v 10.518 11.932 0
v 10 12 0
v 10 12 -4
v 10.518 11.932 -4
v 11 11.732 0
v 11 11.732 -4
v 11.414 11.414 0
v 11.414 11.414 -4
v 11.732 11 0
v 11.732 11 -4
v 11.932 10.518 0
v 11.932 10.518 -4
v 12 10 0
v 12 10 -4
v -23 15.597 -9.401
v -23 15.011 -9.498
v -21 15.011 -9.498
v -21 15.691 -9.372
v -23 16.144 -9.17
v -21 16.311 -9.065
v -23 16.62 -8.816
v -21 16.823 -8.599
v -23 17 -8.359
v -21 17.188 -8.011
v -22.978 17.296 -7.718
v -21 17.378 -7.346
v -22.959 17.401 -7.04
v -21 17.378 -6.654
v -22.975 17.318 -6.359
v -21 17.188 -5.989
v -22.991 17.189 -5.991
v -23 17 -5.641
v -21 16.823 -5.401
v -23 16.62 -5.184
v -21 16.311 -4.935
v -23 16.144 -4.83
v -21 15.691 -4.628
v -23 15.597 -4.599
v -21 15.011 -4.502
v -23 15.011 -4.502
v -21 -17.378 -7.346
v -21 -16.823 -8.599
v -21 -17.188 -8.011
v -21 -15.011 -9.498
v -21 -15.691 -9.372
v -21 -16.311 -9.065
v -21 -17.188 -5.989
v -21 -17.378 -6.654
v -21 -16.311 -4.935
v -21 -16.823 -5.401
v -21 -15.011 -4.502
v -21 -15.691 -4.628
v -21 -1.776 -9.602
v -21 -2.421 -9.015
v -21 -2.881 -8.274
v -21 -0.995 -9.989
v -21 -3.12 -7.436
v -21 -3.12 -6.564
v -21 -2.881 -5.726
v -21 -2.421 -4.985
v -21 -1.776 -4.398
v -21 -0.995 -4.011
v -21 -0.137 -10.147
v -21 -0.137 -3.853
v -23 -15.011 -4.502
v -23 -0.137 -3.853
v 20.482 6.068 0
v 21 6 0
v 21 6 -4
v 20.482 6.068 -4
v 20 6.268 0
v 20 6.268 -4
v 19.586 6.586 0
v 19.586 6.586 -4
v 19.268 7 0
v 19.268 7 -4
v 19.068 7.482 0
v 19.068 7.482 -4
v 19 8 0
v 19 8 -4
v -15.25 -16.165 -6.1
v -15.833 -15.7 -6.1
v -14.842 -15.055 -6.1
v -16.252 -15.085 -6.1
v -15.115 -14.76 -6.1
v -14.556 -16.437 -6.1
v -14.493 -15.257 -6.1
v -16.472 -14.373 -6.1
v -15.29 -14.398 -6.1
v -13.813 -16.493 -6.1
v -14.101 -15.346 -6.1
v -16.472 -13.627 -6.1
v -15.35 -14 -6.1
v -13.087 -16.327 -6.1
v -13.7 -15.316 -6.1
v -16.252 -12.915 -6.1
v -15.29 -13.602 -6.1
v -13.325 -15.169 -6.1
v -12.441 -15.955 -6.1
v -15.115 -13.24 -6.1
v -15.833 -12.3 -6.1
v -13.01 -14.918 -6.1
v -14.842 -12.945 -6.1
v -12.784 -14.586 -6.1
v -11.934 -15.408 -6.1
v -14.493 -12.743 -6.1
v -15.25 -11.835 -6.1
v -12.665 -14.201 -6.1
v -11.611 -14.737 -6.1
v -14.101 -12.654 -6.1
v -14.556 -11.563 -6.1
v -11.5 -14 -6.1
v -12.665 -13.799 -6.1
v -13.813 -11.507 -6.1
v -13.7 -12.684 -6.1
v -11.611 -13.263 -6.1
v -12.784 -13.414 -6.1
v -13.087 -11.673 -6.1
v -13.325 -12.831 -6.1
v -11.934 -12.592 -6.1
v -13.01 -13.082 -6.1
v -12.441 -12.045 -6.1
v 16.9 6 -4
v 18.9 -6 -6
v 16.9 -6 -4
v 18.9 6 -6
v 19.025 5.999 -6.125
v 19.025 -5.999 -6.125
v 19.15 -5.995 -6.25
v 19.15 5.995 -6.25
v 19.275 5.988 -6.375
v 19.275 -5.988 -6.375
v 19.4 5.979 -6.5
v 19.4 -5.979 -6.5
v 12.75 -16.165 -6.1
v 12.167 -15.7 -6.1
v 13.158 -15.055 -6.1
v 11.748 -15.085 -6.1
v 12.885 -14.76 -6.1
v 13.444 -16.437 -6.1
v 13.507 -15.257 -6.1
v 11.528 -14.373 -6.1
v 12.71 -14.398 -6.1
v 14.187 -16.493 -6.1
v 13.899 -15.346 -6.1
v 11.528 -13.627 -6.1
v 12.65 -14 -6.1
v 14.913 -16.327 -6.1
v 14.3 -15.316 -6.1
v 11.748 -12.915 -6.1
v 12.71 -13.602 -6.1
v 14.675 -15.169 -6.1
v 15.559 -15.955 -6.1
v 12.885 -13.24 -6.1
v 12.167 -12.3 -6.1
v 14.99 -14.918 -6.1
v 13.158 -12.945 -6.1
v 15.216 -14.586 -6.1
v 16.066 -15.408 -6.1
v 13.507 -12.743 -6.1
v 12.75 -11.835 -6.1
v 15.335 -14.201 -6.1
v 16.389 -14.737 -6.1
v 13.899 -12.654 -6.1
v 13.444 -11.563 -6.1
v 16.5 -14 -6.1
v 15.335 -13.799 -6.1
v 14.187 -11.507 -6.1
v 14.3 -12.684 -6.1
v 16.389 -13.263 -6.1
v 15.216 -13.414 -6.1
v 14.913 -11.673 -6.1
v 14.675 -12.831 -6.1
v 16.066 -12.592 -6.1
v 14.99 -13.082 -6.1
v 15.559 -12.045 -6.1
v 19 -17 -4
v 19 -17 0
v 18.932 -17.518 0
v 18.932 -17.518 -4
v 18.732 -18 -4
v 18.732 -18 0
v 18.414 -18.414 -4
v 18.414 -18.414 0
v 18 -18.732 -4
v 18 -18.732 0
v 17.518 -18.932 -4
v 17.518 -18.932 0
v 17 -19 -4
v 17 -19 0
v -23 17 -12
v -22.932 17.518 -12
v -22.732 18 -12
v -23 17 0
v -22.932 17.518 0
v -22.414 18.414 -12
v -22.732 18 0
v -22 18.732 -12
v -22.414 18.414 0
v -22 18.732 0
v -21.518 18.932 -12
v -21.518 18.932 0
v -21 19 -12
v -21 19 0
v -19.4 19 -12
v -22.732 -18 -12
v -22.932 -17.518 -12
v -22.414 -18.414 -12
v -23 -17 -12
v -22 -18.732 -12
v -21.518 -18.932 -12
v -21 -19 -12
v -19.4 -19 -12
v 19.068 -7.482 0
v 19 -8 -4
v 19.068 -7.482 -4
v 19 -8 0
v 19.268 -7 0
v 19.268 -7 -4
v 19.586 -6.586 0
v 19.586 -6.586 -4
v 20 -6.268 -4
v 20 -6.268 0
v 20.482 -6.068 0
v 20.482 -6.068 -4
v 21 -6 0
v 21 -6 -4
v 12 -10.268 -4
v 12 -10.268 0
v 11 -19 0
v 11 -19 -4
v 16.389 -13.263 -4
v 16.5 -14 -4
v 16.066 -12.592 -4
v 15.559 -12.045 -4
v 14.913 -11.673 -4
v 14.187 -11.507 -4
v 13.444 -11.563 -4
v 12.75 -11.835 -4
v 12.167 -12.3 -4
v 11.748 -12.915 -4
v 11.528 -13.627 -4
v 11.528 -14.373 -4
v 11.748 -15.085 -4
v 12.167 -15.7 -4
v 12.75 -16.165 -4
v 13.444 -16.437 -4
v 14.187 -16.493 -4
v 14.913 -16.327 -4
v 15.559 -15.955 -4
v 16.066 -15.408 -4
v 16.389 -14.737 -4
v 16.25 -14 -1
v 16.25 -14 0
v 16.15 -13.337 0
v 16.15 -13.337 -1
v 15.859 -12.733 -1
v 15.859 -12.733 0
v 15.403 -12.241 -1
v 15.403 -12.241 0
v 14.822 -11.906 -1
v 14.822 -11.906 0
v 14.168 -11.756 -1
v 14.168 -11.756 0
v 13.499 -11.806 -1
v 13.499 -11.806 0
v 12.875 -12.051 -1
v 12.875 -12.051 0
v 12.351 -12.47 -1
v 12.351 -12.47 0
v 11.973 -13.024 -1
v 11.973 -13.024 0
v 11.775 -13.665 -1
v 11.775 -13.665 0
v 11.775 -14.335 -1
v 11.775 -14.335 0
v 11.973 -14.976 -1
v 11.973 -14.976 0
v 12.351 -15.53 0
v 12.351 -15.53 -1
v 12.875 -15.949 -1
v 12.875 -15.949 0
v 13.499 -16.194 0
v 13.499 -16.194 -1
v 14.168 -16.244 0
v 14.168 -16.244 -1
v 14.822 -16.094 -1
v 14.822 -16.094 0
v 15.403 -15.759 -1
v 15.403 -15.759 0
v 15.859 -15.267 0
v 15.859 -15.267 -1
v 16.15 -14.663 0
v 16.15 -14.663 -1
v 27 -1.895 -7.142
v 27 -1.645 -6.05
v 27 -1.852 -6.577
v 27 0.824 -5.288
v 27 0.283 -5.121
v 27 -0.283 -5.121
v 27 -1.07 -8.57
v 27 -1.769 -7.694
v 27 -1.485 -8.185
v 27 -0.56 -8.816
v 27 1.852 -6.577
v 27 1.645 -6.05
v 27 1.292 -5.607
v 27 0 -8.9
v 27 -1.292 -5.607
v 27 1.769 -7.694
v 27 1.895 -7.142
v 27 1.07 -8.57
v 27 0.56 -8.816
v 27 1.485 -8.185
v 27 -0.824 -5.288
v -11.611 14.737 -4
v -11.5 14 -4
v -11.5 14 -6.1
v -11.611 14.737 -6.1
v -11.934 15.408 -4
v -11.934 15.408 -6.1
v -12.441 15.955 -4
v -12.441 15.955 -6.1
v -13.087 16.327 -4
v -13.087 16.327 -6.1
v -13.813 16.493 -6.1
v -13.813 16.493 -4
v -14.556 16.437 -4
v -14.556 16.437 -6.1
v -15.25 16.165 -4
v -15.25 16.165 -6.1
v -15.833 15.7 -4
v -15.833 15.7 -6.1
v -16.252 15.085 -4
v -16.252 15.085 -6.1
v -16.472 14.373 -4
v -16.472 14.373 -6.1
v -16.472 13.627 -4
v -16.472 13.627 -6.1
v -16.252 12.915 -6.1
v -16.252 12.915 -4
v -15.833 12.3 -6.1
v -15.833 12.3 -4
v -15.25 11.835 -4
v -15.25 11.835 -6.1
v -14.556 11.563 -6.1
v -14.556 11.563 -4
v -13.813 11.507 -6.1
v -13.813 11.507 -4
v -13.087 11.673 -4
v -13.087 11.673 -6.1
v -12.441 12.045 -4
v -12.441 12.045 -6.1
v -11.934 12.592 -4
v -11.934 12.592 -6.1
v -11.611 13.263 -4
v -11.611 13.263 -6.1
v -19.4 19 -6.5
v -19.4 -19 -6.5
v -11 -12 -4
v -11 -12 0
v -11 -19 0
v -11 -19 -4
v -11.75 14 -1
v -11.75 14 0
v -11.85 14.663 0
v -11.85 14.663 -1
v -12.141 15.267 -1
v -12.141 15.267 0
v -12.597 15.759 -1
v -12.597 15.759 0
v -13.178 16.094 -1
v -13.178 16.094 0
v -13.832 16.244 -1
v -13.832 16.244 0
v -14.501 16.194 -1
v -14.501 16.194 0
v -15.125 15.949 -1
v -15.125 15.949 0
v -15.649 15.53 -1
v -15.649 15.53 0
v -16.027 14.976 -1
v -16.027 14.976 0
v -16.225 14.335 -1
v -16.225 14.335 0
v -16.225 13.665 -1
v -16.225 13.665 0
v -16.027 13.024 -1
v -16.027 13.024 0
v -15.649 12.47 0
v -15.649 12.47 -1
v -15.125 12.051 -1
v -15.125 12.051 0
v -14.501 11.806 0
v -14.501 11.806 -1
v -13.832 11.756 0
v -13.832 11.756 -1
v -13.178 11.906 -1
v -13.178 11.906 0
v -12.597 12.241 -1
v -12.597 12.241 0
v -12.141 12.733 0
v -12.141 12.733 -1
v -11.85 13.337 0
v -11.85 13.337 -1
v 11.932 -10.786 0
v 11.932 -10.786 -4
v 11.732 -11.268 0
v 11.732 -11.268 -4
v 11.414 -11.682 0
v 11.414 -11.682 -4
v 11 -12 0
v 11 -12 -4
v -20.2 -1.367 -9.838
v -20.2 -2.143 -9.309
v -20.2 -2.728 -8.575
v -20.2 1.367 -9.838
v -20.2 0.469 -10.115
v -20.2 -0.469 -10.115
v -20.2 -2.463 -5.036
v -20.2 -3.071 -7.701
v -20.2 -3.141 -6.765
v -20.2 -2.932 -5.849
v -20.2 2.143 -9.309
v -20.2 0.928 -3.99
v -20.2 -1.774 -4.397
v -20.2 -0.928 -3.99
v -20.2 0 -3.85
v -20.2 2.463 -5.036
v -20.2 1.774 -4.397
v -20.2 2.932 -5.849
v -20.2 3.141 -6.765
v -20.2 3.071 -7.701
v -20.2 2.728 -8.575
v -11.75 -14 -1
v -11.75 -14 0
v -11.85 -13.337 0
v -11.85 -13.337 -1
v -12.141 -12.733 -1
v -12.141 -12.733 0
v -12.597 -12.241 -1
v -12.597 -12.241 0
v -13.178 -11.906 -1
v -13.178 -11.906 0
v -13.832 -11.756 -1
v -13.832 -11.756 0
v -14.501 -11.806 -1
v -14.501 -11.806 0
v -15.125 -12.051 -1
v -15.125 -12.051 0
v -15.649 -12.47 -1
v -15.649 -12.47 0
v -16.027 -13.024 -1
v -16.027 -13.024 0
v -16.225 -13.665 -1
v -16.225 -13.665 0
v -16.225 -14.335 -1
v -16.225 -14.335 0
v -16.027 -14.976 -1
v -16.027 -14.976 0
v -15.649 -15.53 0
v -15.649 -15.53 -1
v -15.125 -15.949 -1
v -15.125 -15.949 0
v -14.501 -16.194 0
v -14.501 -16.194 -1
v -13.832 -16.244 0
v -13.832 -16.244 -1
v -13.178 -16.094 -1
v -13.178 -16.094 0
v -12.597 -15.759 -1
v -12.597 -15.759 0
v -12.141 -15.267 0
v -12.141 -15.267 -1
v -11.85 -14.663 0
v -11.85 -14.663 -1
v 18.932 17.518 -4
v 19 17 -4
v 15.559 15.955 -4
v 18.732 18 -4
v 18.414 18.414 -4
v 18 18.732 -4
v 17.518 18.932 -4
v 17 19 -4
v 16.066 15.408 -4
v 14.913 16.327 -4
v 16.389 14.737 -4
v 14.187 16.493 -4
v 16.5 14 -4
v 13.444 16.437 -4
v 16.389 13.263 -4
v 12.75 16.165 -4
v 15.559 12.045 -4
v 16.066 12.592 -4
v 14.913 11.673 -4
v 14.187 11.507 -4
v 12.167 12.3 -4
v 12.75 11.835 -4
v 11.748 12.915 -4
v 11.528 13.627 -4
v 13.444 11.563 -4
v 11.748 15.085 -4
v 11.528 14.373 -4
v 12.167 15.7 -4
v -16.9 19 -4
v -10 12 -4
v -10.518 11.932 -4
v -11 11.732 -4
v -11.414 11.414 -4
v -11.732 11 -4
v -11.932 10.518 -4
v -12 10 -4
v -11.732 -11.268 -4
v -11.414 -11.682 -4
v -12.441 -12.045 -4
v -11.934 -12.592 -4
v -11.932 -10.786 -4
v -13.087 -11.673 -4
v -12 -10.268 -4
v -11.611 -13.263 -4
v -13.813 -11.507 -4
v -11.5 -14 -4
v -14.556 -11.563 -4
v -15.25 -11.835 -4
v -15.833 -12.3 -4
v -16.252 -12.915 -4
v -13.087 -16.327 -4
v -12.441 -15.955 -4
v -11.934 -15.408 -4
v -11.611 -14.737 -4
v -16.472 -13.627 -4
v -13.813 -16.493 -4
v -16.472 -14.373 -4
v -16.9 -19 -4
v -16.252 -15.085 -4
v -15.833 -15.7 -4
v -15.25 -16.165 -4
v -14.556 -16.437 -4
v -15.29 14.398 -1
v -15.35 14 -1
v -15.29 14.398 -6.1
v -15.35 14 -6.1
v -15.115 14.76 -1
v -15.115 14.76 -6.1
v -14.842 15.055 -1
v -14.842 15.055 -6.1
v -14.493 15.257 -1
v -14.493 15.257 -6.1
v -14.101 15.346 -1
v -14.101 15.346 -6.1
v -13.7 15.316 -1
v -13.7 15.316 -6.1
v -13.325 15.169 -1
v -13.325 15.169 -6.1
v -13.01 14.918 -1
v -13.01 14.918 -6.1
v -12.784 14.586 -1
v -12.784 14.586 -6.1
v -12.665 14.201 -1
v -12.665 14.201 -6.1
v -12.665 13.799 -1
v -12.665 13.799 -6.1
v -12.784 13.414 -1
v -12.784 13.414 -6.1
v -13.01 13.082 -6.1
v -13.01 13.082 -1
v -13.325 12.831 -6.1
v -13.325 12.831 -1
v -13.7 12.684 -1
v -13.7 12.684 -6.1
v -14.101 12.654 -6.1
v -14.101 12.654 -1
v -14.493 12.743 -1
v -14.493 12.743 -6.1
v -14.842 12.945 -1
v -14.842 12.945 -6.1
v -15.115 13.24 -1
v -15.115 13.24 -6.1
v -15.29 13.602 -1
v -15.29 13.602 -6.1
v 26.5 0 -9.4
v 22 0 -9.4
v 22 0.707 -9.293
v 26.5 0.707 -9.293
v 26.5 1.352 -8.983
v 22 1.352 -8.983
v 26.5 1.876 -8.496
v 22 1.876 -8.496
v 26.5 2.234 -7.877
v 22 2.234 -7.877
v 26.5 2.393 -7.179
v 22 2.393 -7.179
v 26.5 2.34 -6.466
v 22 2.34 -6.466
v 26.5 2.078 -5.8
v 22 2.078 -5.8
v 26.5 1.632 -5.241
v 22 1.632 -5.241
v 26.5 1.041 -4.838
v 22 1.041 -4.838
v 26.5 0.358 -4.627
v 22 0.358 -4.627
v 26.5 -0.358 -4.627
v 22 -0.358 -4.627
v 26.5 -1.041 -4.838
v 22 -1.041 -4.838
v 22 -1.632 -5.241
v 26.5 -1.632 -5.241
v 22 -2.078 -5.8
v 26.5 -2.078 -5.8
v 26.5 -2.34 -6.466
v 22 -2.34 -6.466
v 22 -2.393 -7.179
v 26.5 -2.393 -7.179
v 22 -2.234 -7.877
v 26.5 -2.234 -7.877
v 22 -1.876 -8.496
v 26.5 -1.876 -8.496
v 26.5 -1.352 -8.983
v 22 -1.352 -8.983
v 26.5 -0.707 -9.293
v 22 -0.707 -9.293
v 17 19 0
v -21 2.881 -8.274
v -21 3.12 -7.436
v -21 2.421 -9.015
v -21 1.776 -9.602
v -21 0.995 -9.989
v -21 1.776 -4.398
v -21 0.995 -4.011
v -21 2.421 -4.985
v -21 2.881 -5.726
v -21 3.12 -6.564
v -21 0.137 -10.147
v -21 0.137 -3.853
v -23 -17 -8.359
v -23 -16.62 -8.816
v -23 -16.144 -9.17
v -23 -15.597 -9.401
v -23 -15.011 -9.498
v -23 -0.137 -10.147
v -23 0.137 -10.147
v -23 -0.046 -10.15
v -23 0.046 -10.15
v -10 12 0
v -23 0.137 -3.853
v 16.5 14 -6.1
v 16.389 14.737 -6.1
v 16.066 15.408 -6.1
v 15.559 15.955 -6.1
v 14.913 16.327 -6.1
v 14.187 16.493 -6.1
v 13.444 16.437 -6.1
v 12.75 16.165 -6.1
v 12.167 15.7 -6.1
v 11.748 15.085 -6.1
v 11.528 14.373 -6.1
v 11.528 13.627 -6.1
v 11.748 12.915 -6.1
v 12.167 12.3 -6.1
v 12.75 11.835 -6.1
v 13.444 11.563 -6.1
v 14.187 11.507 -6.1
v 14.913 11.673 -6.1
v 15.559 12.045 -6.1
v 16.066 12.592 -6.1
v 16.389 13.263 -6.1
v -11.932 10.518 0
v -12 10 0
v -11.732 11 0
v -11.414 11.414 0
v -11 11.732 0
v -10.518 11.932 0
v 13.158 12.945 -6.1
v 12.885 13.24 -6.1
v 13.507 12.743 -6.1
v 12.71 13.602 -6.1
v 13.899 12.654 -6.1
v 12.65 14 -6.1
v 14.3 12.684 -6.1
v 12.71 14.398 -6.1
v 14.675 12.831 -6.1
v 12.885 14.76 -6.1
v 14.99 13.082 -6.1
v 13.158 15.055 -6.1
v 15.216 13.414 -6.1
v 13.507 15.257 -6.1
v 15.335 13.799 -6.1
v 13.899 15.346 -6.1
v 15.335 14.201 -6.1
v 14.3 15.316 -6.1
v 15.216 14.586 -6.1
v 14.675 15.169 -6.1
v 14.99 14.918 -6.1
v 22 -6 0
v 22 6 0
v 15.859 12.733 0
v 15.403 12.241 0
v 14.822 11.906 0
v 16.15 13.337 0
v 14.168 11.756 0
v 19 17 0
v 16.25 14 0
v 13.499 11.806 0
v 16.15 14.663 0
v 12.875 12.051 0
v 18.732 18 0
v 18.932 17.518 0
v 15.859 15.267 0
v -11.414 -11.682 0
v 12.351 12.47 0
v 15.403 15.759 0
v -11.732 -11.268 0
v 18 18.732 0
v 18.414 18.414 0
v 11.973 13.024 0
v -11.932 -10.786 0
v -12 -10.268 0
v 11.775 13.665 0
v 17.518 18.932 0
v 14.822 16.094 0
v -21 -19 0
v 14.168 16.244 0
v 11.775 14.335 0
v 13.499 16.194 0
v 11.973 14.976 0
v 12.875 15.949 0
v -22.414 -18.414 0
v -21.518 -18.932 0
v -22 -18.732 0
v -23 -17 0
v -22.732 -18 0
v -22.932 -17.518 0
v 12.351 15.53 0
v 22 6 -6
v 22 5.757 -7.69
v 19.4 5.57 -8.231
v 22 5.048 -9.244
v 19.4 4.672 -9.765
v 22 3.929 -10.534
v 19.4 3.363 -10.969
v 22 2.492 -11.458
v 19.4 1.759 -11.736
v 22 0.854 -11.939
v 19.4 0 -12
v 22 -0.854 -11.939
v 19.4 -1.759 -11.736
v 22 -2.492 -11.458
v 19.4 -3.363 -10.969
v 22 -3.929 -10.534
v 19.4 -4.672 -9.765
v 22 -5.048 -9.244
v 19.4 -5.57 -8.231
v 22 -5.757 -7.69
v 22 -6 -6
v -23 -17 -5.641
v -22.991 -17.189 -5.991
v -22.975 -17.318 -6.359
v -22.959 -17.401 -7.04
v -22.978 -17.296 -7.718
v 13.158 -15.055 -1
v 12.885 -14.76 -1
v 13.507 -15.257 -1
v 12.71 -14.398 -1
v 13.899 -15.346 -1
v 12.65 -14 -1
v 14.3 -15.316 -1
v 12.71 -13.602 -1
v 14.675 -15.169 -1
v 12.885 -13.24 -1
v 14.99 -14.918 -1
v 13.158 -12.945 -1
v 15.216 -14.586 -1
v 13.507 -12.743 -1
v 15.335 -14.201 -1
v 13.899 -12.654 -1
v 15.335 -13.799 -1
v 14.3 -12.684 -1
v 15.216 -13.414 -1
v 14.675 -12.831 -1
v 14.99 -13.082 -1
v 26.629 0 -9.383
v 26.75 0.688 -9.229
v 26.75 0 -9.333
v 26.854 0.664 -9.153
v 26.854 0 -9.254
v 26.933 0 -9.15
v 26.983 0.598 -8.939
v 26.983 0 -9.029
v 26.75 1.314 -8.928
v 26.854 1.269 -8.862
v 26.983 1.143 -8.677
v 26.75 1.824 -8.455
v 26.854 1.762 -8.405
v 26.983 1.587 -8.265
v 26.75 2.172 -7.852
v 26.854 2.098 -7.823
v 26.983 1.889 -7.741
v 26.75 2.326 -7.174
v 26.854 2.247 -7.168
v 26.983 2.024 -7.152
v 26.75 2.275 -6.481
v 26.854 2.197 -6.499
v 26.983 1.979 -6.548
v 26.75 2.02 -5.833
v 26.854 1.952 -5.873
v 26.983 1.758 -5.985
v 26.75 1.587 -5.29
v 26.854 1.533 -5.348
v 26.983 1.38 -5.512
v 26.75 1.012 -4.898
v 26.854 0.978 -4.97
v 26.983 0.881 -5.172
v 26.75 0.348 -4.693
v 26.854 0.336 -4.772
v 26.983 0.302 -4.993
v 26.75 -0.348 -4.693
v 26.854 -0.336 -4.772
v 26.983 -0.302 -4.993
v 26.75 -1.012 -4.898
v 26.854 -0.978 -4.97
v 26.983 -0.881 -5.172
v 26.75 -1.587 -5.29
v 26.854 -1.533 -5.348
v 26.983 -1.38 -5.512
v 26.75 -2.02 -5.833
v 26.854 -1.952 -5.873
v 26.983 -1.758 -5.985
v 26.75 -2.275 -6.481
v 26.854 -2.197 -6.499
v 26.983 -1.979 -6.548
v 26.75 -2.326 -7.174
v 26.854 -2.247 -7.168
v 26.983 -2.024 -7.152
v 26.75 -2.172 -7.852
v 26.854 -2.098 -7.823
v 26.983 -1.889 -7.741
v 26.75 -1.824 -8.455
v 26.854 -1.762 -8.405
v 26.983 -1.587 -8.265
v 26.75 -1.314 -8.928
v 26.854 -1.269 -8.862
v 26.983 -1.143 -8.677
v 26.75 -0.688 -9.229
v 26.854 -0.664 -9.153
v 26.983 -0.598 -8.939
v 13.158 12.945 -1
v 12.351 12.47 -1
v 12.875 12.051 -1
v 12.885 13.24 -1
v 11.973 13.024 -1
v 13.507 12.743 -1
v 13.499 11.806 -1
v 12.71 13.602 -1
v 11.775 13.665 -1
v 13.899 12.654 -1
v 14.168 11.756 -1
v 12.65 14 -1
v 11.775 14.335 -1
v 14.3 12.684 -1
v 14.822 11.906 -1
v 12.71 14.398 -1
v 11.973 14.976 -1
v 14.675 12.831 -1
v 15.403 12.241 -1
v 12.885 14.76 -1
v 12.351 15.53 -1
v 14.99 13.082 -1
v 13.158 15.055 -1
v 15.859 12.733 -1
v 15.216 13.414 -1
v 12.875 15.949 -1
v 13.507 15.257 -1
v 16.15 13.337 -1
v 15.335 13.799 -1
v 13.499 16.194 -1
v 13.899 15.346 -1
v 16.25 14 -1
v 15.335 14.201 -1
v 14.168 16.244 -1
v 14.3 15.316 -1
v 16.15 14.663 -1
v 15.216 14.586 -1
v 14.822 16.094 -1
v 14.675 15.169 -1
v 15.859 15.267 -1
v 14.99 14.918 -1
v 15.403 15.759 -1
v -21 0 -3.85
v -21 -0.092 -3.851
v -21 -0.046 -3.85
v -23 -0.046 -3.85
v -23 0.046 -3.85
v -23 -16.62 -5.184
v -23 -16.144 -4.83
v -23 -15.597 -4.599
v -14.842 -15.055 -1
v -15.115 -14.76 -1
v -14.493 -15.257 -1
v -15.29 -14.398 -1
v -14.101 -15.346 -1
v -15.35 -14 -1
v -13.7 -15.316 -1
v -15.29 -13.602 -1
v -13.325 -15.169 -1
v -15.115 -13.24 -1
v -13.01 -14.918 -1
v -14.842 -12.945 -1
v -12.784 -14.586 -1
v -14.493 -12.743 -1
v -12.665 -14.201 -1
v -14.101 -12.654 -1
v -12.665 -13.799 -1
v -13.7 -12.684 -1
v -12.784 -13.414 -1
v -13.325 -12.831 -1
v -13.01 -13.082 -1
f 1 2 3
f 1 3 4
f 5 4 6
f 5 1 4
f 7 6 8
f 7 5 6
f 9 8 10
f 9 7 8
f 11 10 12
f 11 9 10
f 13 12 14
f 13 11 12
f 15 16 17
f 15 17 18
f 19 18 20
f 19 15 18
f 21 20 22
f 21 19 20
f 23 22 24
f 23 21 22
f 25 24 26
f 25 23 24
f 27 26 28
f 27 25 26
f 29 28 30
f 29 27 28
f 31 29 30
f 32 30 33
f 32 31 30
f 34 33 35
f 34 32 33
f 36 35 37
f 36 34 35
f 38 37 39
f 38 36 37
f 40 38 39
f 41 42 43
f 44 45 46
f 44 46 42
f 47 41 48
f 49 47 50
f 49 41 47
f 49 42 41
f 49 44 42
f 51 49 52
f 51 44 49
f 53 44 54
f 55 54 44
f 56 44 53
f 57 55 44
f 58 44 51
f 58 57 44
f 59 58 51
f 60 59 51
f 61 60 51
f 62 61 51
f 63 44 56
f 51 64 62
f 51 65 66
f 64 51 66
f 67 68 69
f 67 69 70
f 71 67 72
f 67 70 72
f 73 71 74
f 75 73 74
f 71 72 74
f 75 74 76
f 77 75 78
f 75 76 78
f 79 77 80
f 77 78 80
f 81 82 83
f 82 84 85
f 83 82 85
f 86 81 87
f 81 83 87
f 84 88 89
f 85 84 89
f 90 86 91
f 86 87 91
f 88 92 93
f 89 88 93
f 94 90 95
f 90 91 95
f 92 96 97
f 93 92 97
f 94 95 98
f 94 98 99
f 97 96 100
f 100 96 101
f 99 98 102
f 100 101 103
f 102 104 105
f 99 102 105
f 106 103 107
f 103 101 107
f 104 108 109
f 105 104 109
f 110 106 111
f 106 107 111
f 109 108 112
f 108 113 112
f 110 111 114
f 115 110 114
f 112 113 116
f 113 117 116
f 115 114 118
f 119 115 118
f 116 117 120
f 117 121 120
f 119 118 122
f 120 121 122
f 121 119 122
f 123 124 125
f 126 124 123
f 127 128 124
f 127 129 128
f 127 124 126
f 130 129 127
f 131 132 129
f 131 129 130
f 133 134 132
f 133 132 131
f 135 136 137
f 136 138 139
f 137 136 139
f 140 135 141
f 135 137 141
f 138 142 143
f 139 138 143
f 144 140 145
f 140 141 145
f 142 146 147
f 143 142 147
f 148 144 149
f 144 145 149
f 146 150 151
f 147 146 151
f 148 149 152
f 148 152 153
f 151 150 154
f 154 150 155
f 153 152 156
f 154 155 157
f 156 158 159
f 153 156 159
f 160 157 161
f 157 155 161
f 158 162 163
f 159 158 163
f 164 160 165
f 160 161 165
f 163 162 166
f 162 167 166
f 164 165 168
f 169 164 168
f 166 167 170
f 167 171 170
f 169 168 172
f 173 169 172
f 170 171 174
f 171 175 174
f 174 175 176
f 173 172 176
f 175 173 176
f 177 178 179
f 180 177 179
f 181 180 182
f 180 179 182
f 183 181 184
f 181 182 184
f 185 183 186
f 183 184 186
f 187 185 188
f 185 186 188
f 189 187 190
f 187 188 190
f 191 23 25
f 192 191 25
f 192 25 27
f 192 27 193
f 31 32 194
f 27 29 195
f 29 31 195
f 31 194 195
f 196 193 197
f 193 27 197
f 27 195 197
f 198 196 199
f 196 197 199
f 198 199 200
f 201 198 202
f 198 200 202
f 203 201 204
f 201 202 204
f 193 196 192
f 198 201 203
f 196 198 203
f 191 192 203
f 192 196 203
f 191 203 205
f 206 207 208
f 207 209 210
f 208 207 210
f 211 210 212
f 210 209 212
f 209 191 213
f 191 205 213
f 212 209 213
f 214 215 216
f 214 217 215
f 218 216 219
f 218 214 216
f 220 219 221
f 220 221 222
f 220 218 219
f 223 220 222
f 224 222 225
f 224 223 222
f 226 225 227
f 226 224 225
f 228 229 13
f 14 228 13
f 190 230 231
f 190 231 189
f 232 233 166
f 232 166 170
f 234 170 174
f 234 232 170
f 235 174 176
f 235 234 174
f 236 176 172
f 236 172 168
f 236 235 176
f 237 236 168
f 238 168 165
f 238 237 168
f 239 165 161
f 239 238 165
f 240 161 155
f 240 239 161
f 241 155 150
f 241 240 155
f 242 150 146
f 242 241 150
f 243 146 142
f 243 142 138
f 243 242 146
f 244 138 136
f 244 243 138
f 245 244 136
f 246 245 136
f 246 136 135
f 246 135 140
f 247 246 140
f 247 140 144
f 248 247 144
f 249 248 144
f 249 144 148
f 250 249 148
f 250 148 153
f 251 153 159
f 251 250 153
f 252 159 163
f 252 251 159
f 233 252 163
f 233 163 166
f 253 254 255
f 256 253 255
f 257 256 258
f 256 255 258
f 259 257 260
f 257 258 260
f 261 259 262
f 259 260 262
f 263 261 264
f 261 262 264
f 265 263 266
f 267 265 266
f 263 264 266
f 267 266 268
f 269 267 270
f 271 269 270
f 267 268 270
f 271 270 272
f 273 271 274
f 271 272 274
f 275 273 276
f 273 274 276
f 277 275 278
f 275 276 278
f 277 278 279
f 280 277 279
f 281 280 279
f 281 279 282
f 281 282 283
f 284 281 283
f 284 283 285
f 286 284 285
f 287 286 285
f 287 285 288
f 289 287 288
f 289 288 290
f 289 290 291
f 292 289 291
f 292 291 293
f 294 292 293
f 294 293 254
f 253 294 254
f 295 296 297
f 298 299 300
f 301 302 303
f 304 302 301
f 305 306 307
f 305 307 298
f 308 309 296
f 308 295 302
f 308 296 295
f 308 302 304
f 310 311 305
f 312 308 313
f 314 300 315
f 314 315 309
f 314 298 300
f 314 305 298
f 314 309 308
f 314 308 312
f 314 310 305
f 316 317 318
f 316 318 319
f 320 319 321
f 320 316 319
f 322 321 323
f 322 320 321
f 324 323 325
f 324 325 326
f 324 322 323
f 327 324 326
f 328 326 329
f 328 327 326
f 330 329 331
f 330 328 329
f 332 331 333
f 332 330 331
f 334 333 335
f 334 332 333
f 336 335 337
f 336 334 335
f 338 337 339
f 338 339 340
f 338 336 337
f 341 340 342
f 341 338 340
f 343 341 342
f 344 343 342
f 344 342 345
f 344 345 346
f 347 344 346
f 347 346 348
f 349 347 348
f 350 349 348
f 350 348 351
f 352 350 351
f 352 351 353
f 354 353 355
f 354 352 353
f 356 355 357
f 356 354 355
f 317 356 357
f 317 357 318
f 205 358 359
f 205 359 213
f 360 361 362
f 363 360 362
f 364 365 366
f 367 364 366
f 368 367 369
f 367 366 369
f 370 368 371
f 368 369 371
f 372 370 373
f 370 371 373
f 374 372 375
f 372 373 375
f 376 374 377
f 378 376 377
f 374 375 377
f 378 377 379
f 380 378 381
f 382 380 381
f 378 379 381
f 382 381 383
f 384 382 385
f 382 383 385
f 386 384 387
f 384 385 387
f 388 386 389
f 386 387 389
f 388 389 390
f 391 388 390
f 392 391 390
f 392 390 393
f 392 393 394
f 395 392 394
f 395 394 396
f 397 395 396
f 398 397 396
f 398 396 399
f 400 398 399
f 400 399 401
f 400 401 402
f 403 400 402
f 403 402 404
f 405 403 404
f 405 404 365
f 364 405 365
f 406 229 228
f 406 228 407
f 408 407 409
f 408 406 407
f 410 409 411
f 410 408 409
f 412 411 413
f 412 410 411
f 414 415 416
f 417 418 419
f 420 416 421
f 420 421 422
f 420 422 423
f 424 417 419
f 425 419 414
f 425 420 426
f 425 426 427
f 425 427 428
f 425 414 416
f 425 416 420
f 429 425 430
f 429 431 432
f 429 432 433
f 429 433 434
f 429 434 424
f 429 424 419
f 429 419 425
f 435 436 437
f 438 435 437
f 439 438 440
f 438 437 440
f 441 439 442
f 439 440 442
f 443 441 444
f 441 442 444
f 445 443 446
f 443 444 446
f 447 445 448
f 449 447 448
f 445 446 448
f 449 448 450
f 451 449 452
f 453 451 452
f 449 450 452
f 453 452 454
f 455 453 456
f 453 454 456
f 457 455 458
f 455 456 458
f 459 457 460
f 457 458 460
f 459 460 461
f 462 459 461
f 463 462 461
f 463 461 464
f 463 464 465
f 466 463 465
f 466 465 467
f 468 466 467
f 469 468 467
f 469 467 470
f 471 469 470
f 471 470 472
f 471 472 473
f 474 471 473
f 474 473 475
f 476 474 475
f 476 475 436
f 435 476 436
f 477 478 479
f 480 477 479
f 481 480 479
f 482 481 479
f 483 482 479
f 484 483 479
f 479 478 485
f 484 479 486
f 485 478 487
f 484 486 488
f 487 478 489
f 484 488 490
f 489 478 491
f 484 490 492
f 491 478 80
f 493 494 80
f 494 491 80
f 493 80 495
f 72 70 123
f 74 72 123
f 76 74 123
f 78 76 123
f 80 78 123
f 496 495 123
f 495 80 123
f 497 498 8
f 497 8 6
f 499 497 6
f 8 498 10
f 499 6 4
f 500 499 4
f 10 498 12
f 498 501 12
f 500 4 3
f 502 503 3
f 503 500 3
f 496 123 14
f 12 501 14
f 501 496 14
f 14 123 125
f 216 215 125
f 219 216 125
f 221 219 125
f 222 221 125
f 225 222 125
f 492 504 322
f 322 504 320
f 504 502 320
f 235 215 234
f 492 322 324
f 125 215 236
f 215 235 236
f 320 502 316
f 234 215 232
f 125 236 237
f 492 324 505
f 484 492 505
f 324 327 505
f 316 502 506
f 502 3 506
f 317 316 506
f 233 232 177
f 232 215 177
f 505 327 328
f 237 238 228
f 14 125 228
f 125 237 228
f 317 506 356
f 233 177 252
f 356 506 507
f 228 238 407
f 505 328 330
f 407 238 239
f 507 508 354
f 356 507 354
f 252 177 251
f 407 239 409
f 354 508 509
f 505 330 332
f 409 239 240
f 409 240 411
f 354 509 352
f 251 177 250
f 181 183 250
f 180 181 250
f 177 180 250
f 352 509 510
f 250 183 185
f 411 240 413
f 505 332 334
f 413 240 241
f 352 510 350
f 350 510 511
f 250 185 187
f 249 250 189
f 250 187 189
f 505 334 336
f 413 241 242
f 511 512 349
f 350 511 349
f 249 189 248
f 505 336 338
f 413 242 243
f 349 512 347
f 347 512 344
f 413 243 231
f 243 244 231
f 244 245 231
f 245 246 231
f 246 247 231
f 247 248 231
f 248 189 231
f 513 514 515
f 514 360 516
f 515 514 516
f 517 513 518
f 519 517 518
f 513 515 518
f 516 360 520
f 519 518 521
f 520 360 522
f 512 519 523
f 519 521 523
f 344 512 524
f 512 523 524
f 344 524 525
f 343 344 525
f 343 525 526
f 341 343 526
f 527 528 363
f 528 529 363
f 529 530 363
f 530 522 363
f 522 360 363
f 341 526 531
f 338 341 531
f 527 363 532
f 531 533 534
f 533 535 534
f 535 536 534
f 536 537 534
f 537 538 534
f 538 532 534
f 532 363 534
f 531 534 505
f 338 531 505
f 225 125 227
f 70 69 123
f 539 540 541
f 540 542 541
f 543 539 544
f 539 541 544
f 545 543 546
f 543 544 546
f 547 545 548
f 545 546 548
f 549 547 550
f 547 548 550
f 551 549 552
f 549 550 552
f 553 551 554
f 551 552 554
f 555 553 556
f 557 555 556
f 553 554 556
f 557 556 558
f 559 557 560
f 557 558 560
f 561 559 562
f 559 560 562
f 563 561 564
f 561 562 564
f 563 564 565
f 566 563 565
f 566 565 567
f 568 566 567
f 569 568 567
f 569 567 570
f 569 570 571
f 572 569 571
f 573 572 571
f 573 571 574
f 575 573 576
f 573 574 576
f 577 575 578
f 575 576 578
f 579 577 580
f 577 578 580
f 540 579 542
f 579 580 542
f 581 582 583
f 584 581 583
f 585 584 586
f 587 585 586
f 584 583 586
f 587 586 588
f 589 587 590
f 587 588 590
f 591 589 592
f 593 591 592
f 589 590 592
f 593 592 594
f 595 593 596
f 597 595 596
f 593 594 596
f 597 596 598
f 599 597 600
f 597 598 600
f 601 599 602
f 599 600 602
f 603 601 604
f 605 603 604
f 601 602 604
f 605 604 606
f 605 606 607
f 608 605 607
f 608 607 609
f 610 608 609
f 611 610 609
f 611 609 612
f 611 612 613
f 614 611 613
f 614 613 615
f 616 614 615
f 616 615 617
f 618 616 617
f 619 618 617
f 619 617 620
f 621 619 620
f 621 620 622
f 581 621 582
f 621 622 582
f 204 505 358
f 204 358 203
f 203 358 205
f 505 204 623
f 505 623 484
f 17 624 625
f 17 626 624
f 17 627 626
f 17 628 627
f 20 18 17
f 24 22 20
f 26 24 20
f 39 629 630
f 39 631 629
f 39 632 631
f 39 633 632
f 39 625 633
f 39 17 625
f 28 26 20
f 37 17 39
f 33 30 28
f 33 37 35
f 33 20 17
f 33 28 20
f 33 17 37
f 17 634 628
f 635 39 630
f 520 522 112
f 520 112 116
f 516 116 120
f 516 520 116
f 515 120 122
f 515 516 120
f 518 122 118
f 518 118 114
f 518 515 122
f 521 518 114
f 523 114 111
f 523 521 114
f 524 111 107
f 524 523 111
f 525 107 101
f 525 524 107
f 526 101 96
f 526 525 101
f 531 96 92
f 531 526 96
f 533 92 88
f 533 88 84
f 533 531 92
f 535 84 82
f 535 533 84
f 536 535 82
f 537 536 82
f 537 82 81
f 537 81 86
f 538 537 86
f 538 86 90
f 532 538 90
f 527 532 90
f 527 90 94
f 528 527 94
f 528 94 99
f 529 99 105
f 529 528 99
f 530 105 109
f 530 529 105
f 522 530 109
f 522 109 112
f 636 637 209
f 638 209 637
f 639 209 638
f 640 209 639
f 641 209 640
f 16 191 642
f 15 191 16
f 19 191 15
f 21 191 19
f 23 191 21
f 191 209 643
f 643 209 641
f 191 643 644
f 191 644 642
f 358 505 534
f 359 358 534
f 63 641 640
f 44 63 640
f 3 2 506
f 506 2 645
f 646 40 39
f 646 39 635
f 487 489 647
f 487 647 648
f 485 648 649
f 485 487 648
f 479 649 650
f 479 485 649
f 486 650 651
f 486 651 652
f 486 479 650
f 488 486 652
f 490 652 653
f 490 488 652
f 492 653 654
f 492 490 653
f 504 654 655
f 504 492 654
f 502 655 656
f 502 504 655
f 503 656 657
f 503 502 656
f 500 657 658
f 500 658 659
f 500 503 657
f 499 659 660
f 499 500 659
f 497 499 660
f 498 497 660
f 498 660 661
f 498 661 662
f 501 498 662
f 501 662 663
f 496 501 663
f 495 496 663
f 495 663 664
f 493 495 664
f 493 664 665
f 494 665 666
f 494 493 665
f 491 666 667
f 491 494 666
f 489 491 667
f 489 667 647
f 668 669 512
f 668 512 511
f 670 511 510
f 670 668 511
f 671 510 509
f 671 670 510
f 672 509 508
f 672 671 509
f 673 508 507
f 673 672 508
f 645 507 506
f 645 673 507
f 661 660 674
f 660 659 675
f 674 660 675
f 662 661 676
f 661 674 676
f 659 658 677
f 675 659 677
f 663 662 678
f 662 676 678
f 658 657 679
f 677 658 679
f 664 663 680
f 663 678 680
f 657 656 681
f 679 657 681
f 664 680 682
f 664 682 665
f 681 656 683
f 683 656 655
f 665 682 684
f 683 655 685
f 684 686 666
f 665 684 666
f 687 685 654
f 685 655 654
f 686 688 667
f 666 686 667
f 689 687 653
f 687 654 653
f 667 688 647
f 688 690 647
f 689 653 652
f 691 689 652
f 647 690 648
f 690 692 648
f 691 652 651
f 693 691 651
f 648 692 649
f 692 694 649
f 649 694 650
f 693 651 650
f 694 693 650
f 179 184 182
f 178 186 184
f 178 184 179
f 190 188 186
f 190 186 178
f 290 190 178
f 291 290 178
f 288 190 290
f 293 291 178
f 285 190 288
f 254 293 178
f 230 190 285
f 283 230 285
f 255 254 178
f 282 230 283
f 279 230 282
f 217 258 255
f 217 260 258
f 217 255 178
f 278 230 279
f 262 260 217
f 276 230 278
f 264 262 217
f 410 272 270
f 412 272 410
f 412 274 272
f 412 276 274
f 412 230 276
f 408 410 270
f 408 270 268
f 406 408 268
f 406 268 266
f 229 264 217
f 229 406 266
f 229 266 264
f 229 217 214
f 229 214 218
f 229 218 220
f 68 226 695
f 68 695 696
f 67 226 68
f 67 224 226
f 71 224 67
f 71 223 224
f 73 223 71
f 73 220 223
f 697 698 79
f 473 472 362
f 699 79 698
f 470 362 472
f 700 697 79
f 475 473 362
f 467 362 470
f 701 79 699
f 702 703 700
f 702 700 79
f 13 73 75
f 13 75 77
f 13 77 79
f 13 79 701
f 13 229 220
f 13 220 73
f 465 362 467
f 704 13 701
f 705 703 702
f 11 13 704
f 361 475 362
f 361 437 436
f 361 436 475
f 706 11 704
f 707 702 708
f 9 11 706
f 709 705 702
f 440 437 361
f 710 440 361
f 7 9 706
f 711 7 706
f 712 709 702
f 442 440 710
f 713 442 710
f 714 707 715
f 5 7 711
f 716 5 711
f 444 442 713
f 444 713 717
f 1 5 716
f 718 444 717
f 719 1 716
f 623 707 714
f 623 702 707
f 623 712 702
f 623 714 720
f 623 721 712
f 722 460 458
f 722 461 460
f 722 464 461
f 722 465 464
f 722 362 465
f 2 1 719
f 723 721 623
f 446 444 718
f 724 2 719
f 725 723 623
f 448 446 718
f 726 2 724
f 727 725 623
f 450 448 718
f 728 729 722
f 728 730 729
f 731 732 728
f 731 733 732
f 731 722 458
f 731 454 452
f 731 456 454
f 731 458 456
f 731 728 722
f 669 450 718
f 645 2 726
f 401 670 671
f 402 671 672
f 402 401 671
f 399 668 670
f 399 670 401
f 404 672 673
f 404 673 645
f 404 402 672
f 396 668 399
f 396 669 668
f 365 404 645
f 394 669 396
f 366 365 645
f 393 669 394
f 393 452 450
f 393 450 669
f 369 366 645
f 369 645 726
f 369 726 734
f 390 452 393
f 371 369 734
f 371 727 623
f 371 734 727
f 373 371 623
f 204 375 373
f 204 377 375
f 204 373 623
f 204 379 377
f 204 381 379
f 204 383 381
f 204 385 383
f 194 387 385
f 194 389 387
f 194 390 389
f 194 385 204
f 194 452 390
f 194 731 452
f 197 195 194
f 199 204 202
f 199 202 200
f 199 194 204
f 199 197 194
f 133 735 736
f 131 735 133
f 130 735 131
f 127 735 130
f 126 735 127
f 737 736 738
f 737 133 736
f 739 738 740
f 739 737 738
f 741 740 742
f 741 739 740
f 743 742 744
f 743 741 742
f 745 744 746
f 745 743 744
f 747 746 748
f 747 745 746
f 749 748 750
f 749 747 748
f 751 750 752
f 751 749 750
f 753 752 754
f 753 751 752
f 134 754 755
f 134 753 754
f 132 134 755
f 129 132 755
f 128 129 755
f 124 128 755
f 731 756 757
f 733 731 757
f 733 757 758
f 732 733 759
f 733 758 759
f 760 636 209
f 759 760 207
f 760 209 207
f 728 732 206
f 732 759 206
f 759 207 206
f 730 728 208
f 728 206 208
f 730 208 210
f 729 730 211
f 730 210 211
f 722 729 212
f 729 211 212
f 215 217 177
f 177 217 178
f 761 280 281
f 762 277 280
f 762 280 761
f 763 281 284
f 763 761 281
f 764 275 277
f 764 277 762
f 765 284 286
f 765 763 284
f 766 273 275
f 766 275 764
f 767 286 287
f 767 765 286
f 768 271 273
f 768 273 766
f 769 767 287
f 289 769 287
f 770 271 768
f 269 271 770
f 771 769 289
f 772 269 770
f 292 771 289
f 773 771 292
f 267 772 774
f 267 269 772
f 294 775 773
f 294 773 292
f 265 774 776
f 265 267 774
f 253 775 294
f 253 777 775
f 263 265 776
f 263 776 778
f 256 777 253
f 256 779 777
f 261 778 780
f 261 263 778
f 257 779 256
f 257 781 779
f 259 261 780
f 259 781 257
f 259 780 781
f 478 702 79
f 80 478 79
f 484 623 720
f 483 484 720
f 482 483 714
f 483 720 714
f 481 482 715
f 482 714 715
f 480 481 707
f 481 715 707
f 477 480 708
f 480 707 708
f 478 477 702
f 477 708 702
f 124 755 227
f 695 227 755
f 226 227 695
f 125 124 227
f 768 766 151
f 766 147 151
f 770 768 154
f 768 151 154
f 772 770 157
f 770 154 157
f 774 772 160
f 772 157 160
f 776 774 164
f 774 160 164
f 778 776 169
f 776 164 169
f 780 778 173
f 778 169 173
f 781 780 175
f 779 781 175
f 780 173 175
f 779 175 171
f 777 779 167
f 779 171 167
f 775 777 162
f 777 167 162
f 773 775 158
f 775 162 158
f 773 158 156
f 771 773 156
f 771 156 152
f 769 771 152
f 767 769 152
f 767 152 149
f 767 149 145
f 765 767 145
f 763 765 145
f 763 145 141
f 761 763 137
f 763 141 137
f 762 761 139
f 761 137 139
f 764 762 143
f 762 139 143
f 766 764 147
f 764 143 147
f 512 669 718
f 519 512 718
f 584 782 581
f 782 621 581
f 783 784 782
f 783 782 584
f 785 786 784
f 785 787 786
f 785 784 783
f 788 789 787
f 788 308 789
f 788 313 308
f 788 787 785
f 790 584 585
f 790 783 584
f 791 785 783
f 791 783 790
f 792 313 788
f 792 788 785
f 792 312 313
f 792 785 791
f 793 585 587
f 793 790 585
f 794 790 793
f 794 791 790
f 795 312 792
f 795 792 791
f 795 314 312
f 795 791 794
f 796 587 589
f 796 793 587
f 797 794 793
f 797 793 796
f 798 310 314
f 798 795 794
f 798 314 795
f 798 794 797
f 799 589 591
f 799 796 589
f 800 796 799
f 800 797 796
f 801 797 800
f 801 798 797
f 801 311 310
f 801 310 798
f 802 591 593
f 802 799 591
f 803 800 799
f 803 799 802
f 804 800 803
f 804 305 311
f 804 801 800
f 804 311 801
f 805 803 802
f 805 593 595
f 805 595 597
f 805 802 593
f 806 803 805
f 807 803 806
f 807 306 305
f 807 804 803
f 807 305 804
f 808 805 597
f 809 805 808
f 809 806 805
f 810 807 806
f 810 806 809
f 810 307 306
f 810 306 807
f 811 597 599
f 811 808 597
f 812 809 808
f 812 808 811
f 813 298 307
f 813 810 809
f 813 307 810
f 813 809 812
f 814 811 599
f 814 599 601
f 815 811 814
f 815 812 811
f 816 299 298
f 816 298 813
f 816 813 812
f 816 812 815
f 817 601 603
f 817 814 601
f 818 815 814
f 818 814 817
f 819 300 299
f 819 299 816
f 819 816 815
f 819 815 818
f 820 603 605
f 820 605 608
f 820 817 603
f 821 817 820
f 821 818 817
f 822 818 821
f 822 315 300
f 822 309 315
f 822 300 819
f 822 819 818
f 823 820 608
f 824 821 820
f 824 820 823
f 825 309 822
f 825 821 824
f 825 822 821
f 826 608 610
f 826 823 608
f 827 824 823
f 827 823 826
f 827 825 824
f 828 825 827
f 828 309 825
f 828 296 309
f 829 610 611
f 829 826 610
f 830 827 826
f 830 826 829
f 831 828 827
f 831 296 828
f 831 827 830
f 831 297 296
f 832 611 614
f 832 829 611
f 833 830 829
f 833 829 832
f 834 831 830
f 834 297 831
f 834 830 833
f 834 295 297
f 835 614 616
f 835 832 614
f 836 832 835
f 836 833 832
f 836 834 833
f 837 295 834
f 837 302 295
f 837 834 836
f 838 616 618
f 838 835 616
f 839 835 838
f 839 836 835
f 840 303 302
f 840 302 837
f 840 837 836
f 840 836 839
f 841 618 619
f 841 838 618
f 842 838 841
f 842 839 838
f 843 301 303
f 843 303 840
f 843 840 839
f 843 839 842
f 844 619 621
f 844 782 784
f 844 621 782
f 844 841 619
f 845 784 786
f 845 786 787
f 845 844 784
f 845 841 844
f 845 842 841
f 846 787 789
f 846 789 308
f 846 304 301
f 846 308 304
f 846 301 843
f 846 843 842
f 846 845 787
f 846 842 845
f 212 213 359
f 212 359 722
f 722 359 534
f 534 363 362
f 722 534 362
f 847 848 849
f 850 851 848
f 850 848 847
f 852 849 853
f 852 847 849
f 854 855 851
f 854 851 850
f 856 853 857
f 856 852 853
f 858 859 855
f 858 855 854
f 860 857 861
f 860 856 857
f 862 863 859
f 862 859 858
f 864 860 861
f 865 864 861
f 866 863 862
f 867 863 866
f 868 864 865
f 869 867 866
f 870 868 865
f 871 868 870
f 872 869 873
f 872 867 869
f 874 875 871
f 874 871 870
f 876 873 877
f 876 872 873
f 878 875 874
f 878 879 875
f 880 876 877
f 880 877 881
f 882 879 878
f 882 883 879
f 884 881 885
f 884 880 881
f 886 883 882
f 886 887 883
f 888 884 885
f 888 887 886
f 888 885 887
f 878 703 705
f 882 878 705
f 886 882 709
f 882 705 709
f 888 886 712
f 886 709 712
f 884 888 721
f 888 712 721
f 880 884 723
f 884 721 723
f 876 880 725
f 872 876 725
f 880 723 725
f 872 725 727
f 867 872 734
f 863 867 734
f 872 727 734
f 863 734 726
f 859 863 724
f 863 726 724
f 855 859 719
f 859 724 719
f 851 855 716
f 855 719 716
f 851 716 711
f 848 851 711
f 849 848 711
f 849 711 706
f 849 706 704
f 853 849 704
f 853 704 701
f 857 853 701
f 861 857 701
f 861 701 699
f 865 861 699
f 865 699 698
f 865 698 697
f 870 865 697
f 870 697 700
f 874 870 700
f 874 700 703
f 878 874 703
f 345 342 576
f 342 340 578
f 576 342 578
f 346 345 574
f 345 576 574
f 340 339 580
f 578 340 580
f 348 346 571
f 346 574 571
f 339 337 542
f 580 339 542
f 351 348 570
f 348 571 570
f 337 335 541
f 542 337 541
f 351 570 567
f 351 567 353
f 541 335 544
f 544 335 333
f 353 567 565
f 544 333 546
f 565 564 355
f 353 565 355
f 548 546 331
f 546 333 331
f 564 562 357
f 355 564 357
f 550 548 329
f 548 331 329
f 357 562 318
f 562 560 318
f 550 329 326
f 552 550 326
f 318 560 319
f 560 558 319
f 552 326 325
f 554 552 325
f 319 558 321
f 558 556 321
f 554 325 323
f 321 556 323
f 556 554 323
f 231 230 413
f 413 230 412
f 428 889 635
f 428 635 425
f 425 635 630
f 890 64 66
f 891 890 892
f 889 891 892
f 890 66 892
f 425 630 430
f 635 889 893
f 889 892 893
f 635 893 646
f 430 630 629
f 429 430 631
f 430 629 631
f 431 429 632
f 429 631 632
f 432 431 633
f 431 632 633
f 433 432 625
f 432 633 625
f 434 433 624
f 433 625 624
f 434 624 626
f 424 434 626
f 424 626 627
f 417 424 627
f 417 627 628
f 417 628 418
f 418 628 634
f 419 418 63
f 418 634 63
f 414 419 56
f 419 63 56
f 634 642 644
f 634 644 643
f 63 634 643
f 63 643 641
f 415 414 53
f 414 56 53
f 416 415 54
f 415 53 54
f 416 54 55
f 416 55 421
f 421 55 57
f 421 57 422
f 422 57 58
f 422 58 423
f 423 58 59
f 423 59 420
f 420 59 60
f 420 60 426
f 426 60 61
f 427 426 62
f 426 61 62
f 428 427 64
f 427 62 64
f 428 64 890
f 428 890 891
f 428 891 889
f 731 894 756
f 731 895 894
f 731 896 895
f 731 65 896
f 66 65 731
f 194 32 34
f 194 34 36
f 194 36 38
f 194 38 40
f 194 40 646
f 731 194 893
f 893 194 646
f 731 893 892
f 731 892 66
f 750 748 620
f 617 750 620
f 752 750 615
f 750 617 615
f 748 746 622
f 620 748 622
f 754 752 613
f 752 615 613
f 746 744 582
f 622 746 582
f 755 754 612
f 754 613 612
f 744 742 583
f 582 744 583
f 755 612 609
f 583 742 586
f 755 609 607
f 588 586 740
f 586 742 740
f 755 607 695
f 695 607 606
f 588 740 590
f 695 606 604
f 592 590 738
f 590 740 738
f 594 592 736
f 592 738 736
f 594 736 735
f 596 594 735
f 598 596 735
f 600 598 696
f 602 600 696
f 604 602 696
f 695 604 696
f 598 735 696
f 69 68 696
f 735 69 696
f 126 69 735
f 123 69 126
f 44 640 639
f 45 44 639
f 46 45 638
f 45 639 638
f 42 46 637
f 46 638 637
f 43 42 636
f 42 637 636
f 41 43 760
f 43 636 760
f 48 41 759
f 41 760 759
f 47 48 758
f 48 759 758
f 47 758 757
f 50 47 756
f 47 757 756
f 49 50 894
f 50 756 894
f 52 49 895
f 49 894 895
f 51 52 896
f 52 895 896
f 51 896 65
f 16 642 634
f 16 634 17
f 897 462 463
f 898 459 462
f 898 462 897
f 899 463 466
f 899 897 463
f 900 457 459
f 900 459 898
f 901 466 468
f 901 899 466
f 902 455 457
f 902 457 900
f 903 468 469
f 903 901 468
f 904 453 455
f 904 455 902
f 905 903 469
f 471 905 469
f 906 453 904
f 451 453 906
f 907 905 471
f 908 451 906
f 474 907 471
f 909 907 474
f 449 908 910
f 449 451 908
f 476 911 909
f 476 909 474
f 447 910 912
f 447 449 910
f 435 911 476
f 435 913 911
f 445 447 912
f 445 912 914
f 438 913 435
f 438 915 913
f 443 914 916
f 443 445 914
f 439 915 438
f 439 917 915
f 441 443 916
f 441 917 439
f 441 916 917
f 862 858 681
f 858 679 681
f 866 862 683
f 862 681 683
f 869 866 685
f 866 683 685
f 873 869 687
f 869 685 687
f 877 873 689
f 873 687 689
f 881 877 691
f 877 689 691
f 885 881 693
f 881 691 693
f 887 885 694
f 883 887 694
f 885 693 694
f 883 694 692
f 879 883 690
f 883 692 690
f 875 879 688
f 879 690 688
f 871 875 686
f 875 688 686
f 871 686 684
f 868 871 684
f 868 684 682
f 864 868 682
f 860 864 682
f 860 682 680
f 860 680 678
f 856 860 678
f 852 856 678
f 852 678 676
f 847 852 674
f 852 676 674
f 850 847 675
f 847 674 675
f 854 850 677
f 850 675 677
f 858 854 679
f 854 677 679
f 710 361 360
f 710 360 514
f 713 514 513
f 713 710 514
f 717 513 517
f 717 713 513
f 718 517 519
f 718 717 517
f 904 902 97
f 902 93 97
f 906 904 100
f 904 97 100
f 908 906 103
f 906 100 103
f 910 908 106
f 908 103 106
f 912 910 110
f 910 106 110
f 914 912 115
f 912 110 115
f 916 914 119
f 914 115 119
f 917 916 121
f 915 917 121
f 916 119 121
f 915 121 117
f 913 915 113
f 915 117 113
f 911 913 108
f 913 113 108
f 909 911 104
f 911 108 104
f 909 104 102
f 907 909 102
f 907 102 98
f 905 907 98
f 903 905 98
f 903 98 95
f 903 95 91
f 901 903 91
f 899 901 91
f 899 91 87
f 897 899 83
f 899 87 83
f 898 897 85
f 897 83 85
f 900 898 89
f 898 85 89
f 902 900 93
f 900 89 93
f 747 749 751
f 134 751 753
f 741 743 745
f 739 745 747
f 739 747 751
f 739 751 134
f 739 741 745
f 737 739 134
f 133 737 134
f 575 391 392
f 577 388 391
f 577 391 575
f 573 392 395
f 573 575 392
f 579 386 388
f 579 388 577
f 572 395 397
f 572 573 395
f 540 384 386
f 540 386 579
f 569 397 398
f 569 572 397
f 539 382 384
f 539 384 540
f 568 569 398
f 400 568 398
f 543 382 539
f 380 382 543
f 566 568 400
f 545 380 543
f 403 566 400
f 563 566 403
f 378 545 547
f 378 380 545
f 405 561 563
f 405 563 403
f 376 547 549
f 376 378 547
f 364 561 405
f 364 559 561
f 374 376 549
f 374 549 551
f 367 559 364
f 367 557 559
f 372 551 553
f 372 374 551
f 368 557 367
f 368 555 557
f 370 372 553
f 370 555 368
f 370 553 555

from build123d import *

# Parameters (mm, degrees)
EXTRUDE_1_DEPTH           = 4
EXTRUDE_START             = -4
SKETCH_6_R                = 2.5000000000000004
SKETCH_6_R_2              = 2.4999999999999987
EXTRUDE_5_DEPTH           = 2.1
HOLE_WIZARD_1_D           = 2.7
HOLE_WIZARD_1_CBORE_D     = 4.5
HOLE_WIZARD_1_CBORE_DEPTH = 1
EXTRUDE_3_DEPTH           = 4
FILLET_1_R                = 2
CUT_EXTRUDE_1_DEPTH       = 2
SKETCH_14_R               = 3.150000000000003
CUT_EXTRUDE_4_DEPTH       = 0.8
EXTRUDE_6_DEPTH           = 3
SKETCH_11_R               = 2.399999999999999
EXTRUDE_7_DEPTH           = 5
FILLET_2_RADIUS           = 6
FILLET_2_LENGTH           = 3
FILLET_4_R                = 2
FILLET_6_R                = 0.5
CUT_EXTRUDE_2_DEPTH       = 0.4
CUT_EXTRUDE_3_DEPTH       = 0.4
CHAMFER_1_SIZE            = 2.5


with BuildPart() as part:
    # 草图1 → 凸台-拉伸1 (new body)
    with BuildSketch(Plane.XY):
        Polygon((19, -19), (11.999999999999977, -19), (11.000000000000004, -19), (11.000000000000002, -11.999999999999998), (11.999999999999977, -11.999999999999973), (11.999999999999977, 12.000000000000027), (-12.000000000000023, 12.000000000000023), (-12.000000000000023, -11.999999999999977), (-10.999999999999996, -12.000000000000002), (-10.999999999999996, -19), (-11.999999999999996, -19), (-19, -19), (-19, 19), (19, 19), align=None)
    extrude(amount=-EXTRUDE_1_DEPTH)

    # 草图6 → 凸台-拉伸5 (add)
    with BuildSketch(Plane.XY.offset(EXTRUDE_START)):
        with Locations((-14.000000000000115, 14.000000000000014)):
            Circle(SKETCH_6_R)
        with Locations((-14.000000000000112, -13.999999999999996)):
            Circle(SKETCH_6_R)
        with Locations((14.0000000000001, -13.99999999999998)):
            Circle(SKETCH_6_R_2)
        with Locations((14.000000000000096, 14.00000000000002)):
            Circle(SKETCH_6_R_2)
    extrude(amount=-EXTRUDE_5_DEPTH)

    # 孔1 (through all)
    with Locations(Plane.XY):
        with Locations((-14, 14), (14, -14), (14, 14), (-14, -14), (0, 0), (0.008296822, -0.048065229)):
            CounterBoreHole(HOLE_WIZARD_1_D / 2, HOLE_WIZARD_1_CBORE_D / 2, HOLE_WIZARD_1_CBORE_DEPTH)

    # 草图5 → 凸台-拉伸3 (add)
    with BuildSketch(Plane.ZY.offset(19)):
        Polygon((-12.000000000000004, -19.000000000000007), (-4.47e-15, -19.000000000000004), (-3.7e-16, 18.999999999999996), (-12.000000000000004, 18.999999999999993), align=None)
    extrude(amount=EXTRUDE_3_DEPTH)

    # 圆角1
    # the kernel refuses this fillet: 2 mm, written as the material it adds along each edge
    with BuildSketch(Plane(origin=(11.999999999999977, 12.000000000000027, 0), x_dir=(-1, 0, 0), z_dir=(0, 0, -1)), Plane(origin=(-12.000000000000023, 12.000000000000023, 0), x_dir=(0, -1, 0), z_dir=(0, 0, -1))) as fillet_1_piece_1:
        with BuildLine():
            CenterArc((FILLET_1_R, -FILLET_1_R), FILLET_1_R, 90, 90)
            Line((0, -FILLET_1_R), (0, 0))
            Line((0, 0), (FILLET_1_R, 0))
        make_face()
    extrude(amount=4)
    with BuildSketch(Plane(origin=(11.999999999999977, -11.999999999999973, 0), x_dir=(0, 1, 0), z_dir=(0, 0, -1))) as fillet_1_piece_2:
        with BuildLine():
            CenterArc((1.7320508075689318, -2), FILLET_1_R, 90, 60.00000000000051)
            Line((4.619e-14, -1.000000000000016), (0, 0))
            Line((0, 0), (1.7320508075689318, 0))
        make_face()
    extrude(amount=4)
    with BuildSketch(Plane(origin=(-12.000000000000023, -11.999999999999977, 0), x_dir=(1, 4.796e-14, 0), z_dir=(0, 0, -1))) as fillet_1_piece_3:
        with BuildLine():
            CenterArc((2.000000000000083, -1.7320508075688679), FILLET_1_R, 120.00000000000053, 60.00000000000222)
            Line((8.307e-14, -1.7320508075689638), (0, 0))
            Line((0, 0), (1.0000000000000675, 0))
        make_face()
    extrude(amount=4)
    # the kernel refuses this fillet: 2 mm, written as the material it takes off along each edge
    with BuildSketch(Plane(origin=(19, -19, 5), x_dir=(-1, 0, 0), z_dir=(0, 0, -1)), Plane(origin=(19, 19, 5), x_dir=(0, -1, 0), z_dir=(0, 0, -1))) as fillet_1_2_piece_1:
        with BuildLine():
            CenterArc((FILLET_1_R, FILLET_1_R), FILLET_1_R, 180, 90)
            Line((0, FILLET_1_R), (0, 0))
            Line((0, 0), (FILLET_1_R, 0))
        make_face()
    extrude(amount=14, mode=Mode.SUBTRACT)
    with BuildSketch(Plane(origin=(-23, -19.000000000000007, -17.000000000000004), x_dir=(1, 3.55e-15, 0), z_dir=(0, 3e-16, 1))) as fillet_1_2_piece_2:
        with BuildLine():
            CenterArc((FILLET_1_R, FILLET_1_R), FILLET_1_R, 180, 89.99999999999977)
            Line((7.11e-15, FILLET_1_R), (0, 0))
            Line((0, 0), (FILLET_1_R, 0))
        make_face()
    extrude(amount=22, mode=Mode.SUBTRACT)
    with BuildSketch(Plane(origin=(-23, 18.999999999999996, 5), x_dir=(1, 3.55e-15, 0), z_dir=(0, -3e-16, -1))) as fillet_1_2_piece_3:
        with BuildLine():
            CenterArc((FILLET_1_R, FILLET_1_R), FILLET_1_R, 180, 90.00000000000023)
            Line((-7.11e-15, FILLET_1_R), (0, 0))
            Line((0, 0), (FILLET_1_R, 0))
        make_face()
    extrude(amount=22.000000000000004, mode=Mode.SUBTRACT)

    # 草图9 → 切除-拉伸1 (cut)
    with BuildSketch(Plane(origin=(-23, 0, -24), x_dir=(0, 0, -1), z_dir=(1, 0, 0))):
        with BuildLine():
            Line((-19.497620553954647, -15.010679125349048), (-20.147001897982854, -0.1374010702007968))
            ThreePointArc((-20.147001897982854, -0.1374010702007968), (-16.999999999999996, 3.149999999999999), (-13.852998102017144, -0.13740107020079845))
            Line((-13.852998102017144, -0.13740107020079845), (-14.50237944604535, -15.01067912534905))
            ThreePointArc((-14.50237944604535, -15.01067912534905), (-16.999999999999993, -17.401630656935822), (-19.497620553954647, -15.010679125349048))
        make_face()
    cut_extrude_1 = extrude(amount=CUT_EXTRUDE_1_DEPTH, mode=Mode.SUBTRACT)

    # 镜向2: 切除-拉伸1 across plane
    add(cut_extrude_1.mirror(Plane.ZX), mode=Mode.SUBTRACT)

    # 草图14 → 切除-拉伸4 (cut)
    with BuildSketch(Plane.ZY.offset(20.999999999999996)):
        with Locations((-7.000000000000003, -6.1e-16)):
            Circle(SKETCH_14_R)
    extrude(amount=-CUT_EXTRUDE_4_DEPTH, mode=Mode.SUBTRACT)

    # 草图10 → 凸台-拉伸6 (add)
    with BuildSketch(Plane(origin=(19, 0, 0), x_dir=(0, 0, -1), z_dir=(1, 0, 0))):
        Polygon((1.59e-15, 6), (12.000000000000002, 6.000000000000002), (12.000000000000002, -6.000000000000002), (1.59e-15, -6), align=None)
    extrude(amount=EXTRUDE_6_DEPTH)

    # 草图11 → 凸台-拉伸7 (add)
    with BuildSketch(Plane(origin=(22, 0, 0), x_dir=(0, 0, -1), z_dir=(1, 0, 0))):
        with Locations((7.000000000000001, 0)):
            Circle(SKETCH_11_R)
    extrude(amount=EXTRUDE_7_DEPTH)

    # 圆角2: full round fillet: the end face becomes a half cylinder, R = half its width
    fillet_2_face = Plane((20.5, 0, -12), x_dir=(-1, 0, 0), z_dir=(0, 0, -1))  # on the end face: x along it, z out of the body
    fillet_2_slab = fillet_2_face.offset(-FILLET_2_RADIUS / 2) * Box(FILLET_2_LENGTH, 2 * FILLET_2_RADIUS, FILLET_2_RADIUS, mode=Mode.PRIVATE)  # the body's end, R deep
    fillet_2_round = Plane((20.5, 0, -6), x_dir=(0, 0, -1), z_dir=(-1, 0, 0)) * Cylinder(FILLET_2_RADIUS, FILLET_2_LENGTH, mode=Mode.PRIVATE)  # its axis R under the face
    add(fillet_2_slab - fillet_2_round, mode=Mode.SUBTRACT)

    # 圆角4
    fillet_4_edges = [part.edges().sort_by_distance(p)[0] for p in [
        (19, -6, -2.0000000000000018),
        (19, 6, -2.000000000000001),
    ]]
    fillet(fillet_4_edges, radius=FILLET_4_R)

    # 圆角6
    fillet_6_edges = [part.edges().sort_by_distance(p)[0] for p in [
        (27, 2.9e-16, -4.600000000000001),
    ]]
    fillet(fillet_6_edges, radius=FILLET_6_R)

    # 草图12 → 切除-拉伸2 (cut)
    with BuildSketch(Plane.ZY.offset(-19)):
        with BuildLine():
            Line((-4, 6.000000000000001), (-5.999999999999998, 6.000000000000001))
            ThreePointArc((-5.999999999999998, 6.000000000000001), (-12, 7.3e-16), (-6, -6.000000000000001))
            Line((-6, -6.000000000000001), (-4, -6.000000000000001))
            Line((-4, -6.000000000000001), (-4, 6.000000000000001))
        make_face()
    extrude(amount=-CUT_EXTRUDE_2_DEPTH, mode=Mode.SUBTRACT)

    # 草图13 → 切除-拉伸3 (cut)
    with BuildSketch(Plane(origin=(-19, 0, 0), x_dir=(0, 0, -1), z_dir=(1, 0, 0))):
        Polygon((12.000000000000004, -19.000000000000007), (12.000000000000004, 18.999999999999993), (4, 19), (4, -19.000000000000004), align=None)
    extrude(amount=-CUT_EXTRUDE_3_DEPTH, mode=Mode.SUBTRACT)

    # 倒角1
    chamfer_1_edges = [part.edges().sort_by_distance(p)[0] for p in [
        (-19.4, 0, -4),
        (19.4, 0, -4),
    ]]
    chamfer(chamfer_1_edges, length=CHAMFER_1_SIZE)


solid = part.part
